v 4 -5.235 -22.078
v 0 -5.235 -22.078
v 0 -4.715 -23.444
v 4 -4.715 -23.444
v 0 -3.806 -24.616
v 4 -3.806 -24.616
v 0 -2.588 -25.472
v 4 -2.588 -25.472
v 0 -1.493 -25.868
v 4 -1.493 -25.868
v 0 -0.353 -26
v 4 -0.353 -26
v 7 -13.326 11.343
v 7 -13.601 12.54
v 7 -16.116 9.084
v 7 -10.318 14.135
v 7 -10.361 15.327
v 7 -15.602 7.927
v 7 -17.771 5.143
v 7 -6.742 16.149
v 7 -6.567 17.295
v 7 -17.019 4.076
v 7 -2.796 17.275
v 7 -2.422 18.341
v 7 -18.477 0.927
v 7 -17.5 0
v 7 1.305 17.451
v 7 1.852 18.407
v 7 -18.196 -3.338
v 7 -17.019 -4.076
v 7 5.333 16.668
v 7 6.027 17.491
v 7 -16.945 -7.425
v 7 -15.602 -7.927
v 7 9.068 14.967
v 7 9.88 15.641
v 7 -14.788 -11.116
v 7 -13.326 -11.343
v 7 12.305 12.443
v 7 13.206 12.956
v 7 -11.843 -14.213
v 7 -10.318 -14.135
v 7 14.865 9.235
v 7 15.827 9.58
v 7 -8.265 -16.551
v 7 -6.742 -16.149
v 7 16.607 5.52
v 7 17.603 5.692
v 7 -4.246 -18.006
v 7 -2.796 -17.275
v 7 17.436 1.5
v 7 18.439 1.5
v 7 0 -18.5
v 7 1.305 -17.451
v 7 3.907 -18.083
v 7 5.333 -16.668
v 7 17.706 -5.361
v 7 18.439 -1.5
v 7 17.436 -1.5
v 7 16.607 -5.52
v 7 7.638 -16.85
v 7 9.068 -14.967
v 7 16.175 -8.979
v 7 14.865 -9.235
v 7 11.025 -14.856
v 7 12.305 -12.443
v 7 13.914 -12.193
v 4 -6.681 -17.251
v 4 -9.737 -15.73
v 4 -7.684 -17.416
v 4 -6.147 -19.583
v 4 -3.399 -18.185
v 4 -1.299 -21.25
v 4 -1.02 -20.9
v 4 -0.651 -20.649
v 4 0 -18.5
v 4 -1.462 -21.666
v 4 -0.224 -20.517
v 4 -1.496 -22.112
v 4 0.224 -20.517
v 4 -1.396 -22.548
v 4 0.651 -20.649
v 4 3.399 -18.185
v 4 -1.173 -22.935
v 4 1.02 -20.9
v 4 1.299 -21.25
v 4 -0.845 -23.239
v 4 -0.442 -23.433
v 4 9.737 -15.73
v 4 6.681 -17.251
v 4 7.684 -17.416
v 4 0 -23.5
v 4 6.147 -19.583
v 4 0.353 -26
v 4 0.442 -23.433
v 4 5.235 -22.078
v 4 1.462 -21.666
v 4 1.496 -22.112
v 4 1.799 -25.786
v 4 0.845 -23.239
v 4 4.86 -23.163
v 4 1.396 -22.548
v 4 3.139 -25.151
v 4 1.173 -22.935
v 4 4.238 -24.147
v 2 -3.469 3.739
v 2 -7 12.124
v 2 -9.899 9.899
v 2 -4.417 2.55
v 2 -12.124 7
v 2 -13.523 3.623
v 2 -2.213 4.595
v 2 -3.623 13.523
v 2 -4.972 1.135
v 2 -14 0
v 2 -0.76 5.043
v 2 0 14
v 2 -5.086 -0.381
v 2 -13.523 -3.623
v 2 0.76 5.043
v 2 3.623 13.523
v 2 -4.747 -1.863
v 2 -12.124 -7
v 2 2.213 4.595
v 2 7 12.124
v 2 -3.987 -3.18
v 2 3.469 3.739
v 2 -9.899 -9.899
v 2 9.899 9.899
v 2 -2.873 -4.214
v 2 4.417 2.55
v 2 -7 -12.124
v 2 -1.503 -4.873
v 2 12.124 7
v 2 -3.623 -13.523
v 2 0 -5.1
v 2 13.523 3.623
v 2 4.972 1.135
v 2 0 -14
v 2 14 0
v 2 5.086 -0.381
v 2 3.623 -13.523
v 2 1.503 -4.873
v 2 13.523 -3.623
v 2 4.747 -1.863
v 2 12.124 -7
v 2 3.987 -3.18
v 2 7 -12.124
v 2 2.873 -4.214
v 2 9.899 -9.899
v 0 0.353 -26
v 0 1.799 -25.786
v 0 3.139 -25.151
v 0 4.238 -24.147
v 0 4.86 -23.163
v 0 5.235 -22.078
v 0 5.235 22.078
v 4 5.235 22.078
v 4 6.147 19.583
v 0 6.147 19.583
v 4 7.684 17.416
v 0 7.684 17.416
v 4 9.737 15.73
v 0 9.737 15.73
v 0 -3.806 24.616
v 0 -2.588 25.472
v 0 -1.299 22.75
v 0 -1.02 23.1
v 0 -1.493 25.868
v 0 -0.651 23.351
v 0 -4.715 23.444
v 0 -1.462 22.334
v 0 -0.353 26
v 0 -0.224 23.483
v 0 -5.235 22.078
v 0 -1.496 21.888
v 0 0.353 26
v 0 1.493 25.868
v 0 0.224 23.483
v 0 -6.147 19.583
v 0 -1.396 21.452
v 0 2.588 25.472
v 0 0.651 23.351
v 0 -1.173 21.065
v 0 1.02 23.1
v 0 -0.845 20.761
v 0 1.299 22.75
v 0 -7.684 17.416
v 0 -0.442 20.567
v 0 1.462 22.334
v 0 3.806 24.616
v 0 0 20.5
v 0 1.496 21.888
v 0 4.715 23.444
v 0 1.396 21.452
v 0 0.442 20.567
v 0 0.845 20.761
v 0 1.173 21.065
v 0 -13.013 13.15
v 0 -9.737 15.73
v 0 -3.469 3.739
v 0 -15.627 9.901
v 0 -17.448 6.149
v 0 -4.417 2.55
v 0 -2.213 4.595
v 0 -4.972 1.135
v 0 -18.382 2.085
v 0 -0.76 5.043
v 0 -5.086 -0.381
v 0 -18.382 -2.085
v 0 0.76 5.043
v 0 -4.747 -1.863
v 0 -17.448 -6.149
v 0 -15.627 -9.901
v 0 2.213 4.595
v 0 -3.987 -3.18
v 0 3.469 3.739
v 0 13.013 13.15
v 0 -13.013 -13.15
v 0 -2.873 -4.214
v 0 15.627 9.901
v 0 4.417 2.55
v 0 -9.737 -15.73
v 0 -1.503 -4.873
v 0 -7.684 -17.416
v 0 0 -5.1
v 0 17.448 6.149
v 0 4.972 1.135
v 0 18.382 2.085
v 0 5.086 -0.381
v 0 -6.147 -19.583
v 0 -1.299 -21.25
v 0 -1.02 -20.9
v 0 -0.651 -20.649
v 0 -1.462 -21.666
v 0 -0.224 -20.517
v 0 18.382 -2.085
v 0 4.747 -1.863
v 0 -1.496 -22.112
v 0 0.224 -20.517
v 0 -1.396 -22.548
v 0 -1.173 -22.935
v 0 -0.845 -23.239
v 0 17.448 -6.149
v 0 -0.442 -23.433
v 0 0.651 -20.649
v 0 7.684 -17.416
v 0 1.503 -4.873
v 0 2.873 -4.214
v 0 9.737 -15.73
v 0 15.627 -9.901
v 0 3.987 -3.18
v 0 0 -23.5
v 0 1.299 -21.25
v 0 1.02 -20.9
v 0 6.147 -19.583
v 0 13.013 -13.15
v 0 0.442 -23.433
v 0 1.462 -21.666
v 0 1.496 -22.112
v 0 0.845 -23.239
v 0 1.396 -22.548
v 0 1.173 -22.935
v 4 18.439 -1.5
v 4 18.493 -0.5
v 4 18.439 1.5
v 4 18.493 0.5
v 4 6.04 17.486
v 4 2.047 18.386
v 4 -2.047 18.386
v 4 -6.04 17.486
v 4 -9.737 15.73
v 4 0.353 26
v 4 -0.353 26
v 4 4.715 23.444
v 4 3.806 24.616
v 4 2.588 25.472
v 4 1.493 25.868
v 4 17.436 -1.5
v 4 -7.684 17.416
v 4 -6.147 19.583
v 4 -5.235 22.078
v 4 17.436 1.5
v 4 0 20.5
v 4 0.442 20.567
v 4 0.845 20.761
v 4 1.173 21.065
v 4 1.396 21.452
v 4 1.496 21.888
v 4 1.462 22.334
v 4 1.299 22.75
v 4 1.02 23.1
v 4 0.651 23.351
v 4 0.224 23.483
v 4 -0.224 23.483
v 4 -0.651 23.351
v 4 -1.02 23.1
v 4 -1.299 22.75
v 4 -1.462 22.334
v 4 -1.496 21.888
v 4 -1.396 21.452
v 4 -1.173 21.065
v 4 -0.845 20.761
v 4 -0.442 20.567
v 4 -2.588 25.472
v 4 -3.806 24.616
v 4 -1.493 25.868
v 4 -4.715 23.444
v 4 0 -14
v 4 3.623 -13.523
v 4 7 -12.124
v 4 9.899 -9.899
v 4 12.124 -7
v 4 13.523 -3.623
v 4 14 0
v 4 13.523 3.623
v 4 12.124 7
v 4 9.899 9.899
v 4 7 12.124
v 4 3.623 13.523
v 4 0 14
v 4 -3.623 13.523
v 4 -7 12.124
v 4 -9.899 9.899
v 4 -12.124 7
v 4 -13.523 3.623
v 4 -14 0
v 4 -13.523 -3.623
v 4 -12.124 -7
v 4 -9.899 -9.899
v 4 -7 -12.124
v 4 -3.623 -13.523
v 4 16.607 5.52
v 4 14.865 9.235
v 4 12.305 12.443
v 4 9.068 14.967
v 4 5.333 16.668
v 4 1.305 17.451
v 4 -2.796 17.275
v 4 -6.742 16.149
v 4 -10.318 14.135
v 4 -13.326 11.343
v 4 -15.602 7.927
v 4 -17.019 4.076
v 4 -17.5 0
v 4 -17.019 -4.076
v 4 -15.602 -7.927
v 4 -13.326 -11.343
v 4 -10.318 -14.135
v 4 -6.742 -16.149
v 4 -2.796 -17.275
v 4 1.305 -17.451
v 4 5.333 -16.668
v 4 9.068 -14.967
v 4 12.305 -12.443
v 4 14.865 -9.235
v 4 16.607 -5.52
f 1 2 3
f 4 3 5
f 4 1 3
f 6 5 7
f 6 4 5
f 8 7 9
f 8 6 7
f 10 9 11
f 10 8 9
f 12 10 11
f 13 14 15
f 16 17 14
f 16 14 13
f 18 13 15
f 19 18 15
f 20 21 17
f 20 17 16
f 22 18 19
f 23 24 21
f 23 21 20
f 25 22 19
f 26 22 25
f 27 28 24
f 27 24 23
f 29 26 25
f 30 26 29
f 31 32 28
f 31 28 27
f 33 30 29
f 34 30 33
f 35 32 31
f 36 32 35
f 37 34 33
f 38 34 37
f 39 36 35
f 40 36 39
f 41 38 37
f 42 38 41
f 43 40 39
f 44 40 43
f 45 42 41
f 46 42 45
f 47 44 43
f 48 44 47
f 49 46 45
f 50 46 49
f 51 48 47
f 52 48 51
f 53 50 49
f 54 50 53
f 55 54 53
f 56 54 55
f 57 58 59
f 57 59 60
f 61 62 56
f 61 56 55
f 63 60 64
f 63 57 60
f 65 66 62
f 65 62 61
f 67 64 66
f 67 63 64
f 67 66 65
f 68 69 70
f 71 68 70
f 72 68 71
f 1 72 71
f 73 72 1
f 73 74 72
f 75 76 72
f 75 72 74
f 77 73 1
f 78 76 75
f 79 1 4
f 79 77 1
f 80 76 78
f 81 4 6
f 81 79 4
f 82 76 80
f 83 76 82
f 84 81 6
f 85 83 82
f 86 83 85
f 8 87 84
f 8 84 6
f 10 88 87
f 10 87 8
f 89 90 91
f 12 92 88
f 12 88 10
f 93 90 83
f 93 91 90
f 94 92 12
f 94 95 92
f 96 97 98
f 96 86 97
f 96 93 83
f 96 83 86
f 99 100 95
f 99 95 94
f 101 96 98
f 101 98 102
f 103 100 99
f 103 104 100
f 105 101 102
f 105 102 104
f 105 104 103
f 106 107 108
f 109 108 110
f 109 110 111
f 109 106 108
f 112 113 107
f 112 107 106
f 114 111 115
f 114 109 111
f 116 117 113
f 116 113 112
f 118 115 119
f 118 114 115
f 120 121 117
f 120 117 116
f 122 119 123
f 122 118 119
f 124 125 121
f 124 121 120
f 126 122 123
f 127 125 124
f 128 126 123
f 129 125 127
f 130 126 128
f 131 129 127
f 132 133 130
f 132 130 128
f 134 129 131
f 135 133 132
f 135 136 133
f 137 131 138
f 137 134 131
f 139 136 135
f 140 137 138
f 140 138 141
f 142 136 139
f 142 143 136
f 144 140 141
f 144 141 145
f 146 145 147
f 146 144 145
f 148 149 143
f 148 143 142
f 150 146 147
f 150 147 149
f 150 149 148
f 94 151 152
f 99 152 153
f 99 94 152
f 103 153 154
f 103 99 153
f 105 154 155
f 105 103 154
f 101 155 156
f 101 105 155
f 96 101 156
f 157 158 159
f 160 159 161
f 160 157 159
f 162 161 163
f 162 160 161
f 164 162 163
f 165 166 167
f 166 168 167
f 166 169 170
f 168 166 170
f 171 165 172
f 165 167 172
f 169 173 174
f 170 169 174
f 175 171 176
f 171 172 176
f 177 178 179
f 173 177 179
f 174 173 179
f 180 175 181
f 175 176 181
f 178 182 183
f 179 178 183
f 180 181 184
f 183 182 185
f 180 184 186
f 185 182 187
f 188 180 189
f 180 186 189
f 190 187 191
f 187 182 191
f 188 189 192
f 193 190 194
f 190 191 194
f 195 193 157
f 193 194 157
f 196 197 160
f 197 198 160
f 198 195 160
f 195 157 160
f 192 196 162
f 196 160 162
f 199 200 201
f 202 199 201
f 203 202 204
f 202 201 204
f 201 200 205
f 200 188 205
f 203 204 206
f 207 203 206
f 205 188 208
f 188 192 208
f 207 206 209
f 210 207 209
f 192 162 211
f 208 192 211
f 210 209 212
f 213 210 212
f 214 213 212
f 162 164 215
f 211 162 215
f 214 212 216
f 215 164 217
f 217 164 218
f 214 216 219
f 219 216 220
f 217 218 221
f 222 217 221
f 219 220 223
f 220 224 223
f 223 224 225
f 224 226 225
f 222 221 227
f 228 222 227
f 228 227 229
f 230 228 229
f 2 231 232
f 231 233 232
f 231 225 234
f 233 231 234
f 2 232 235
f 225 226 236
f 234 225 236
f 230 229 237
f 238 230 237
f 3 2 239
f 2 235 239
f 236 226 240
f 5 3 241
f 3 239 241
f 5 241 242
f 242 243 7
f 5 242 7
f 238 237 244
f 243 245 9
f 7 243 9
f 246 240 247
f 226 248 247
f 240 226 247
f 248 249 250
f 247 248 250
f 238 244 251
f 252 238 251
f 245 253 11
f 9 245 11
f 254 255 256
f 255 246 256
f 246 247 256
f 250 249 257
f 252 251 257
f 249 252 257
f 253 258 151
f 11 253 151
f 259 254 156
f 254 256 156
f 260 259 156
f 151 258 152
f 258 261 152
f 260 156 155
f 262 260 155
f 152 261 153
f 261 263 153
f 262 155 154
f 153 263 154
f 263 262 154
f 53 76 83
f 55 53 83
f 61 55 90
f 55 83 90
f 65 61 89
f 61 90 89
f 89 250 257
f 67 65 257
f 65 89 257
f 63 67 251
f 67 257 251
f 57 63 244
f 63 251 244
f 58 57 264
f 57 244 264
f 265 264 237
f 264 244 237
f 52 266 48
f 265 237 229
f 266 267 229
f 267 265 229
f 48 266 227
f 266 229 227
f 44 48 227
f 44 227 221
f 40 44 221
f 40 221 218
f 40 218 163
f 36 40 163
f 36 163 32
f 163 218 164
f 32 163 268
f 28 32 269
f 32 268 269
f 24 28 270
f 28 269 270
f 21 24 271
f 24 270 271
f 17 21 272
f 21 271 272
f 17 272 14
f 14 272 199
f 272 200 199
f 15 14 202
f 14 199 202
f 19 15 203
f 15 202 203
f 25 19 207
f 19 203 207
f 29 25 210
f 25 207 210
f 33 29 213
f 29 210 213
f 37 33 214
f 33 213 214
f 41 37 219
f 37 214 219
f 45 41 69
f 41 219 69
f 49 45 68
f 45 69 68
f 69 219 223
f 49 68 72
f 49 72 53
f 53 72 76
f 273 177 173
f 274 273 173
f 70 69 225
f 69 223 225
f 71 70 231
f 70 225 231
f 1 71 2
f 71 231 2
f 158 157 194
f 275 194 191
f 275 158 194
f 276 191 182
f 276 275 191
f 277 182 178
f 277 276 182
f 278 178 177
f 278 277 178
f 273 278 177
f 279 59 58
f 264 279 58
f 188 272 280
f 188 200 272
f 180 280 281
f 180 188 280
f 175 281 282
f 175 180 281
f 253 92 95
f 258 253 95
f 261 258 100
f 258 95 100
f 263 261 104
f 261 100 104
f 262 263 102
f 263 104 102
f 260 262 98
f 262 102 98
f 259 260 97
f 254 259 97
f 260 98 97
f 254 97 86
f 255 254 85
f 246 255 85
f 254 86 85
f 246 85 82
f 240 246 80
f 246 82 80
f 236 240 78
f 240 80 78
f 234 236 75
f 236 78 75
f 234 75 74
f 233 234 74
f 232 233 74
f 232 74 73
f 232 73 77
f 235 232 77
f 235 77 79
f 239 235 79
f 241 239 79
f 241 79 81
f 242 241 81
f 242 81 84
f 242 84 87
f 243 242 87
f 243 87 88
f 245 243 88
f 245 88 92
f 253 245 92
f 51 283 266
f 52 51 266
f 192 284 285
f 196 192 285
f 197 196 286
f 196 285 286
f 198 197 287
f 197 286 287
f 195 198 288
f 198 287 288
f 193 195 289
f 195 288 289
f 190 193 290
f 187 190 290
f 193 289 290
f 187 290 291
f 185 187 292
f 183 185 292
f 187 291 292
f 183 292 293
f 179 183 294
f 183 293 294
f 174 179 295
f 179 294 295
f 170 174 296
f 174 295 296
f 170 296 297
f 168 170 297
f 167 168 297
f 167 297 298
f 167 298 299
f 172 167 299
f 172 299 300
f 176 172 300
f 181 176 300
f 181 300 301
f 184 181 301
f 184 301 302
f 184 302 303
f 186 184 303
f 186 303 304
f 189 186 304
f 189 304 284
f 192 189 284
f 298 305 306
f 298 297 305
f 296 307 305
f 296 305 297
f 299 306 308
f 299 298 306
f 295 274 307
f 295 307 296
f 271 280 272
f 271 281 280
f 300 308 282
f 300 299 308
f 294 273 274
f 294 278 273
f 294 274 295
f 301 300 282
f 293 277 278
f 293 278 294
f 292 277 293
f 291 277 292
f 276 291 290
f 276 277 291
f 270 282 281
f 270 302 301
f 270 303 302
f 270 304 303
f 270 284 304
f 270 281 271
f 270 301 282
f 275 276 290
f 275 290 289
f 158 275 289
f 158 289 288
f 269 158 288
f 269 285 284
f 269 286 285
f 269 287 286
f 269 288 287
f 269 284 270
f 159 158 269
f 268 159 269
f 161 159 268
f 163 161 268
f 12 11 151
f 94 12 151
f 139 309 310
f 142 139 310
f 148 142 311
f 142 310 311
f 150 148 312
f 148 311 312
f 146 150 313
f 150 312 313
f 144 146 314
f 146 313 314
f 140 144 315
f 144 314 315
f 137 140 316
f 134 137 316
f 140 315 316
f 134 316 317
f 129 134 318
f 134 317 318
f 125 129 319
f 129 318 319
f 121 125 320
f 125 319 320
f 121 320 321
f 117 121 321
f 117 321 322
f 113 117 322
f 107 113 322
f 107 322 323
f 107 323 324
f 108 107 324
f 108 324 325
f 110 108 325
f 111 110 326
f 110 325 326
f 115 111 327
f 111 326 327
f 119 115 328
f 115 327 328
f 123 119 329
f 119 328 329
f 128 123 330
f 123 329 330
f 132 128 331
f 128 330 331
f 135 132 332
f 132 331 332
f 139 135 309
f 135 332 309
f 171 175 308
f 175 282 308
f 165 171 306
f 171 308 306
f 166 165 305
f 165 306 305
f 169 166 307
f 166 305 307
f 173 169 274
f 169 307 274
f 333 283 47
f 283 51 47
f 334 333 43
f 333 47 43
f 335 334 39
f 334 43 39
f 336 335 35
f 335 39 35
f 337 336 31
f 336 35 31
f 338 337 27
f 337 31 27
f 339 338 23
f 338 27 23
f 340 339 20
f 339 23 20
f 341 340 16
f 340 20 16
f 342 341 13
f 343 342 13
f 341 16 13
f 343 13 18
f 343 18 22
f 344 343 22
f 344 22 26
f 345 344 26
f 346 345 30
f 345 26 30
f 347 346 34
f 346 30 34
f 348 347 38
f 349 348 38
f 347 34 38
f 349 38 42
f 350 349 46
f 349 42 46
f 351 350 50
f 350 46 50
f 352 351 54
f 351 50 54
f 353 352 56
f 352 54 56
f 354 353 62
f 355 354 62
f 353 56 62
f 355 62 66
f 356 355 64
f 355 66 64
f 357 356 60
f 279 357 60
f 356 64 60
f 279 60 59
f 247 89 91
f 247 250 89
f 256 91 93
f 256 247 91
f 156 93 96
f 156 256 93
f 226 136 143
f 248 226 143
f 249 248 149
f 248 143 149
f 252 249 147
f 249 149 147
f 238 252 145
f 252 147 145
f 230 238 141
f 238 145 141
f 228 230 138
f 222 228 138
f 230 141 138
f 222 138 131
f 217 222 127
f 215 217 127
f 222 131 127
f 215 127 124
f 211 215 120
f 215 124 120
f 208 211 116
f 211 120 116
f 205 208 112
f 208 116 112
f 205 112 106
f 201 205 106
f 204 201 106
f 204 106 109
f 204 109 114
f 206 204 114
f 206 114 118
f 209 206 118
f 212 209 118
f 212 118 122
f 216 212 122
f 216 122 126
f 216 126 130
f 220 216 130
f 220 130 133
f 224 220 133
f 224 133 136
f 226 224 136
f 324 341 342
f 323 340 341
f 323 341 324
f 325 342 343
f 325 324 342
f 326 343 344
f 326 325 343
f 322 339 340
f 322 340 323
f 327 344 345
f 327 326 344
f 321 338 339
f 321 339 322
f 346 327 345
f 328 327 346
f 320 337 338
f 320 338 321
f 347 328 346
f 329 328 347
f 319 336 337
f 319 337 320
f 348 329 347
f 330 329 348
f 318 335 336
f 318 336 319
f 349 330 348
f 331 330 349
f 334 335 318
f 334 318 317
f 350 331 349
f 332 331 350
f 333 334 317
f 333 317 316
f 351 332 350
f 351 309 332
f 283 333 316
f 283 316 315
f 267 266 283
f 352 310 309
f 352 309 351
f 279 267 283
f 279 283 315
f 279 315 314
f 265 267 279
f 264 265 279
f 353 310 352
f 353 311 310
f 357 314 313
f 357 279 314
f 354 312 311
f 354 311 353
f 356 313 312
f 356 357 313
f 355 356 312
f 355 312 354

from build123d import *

# Parameters (mm, degrees)
SKETCH_1_R          = 18.5
EXTRUDE_1_DEPTH     = 7
EXTRUDE_2_DEPTH     = 4
SKETCH_2_R          = 17.5
CUT_EXTRUDE_1_DEPTH = 3
SKETCH_3_R          = 14
CUT_EXTRUDE_2_DEPTH = 2
CUT_EXTRUDE_5_REACH = 34.299
SKETCH_8_R          = 5.1
CUT_EXTRUDE_6_REACH = 34.16
SKETCH_11_R         = 1.5
FILLET_1_R          = 10
FILLET_2_R          = 5
SKETCH_12_W         = 3
SKETCH_12_H         = 2.288293169
CUT_EXTRUDE_7_DEPTH = 3


with BuildPart() as part:
    # 草图1 → 凸台-拉伸1 (new body)
    with BuildSketch(Plane(origin=(0, 0, 0), x_dir=(0, 0, -1), z_dir=(1, 0, 0))):
        Circle(SKETCH_1_R)
    extrude(amount=EXTRUDE_1_DEPTH)

    # 草图10 → 凸台-拉伸2 (add)
    with BuildSketch(Plane.ZY):
        Polygon((0, 5), (26, 5), (26, -5), (0, -5), (-26, -5), (-26, 5), align=None)
    extrude(amount=-EXTRUDE_2_DEPTH)

    # 草图2 → 切除-拉伸1 (cut)
    with BuildSketch(Plane(origin=(7, 0, 0), x_dir=(0, 0, -1), z_dir=(1, 0, 0))):
        Circle(SKETCH_2_R)
    extrude(amount=-CUT_EXTRUDE_1_DEPTH, mode=Mode.SUBTRACT)

    # 草图3 → 切除-拉伸2 (cut)
    with BuildSketch(Plane(origin=(4, 0, 0), x_dir=(0, 0, -1), z_dir=(1, 0, 0))):
        Circle(SKETCH_3_R)
    extrude(amount=-CUT_EXTRUDE_2_DEPTH, mode=Mode.SUBTRACT)

    # 草图8 → 切除-拉伸5 (cut, up to next)
    with BuildSketch(Plane(origin=(2, 0, 0), x_dir=(0, 0, -1), z_dir=(1, 0, 0)), mode=Mode.PRIVATE) as cut_extrude_5_sk1:
        Circle(SKETCH_8_R)
    cut_extrude_5_tool1 = extrude(cut_extrude_5_sk1.sketch, amount=-CUT_EXTRUDE_5_REACH, mode=Mode.PRIVATE) & part.part
    add(cut_extrude_5_tool1.solids().sort_by_distance((2, 0, 0))[0], mode=Mode.SUBTRACT)

    # 草图11 → 切除-拉伸6 (cut, up to next)
    with BuildSketch(Plane(origin=(4, 0, 0), x_dir=(0, 0, -1), z_dir=(1, 0, 0)), mode=Mode.PRIVATE) as cut_extrude_6_sk1:
        with Locations((-22, 0)):
            Circle(SKETCH_11_R)
    cut_extrude_6_tool1 = extrude(cut_extrude_6_sk1.sketch, amount=-CUT_EXTRUDE_6_REACH, mode=Mode.PRIVATE) & part.part
    # 草图11 → 切除-拉伸6 (cut, up to next)
    with BuildSketch(Plane(origin=(4, 0, 0), x_dir=(0, 0, -1), z_dir=(1, 0, 0)), mode=Mode.PRIVATE) as cut_extrude_6_sk2:
        with Locations((22, 0)):
            Circle(SKETCH_11_R)
    cut_extrude_6_tool2 = extrude(cut_extrude_6_sk2.sketch, amount=-CUT_EXTRUDE_6_REACH, mode=Mode.PRIVATE) & part.part
    add(cut_extrude_6_tool1.solids().sort_by_distance((4, 0, 22))[0], mode=Mode.SUBTRACT)
    add(cut_extrude_6_tool2.solids().sort_by_distance((4, 0, -22))[0], mode=Mode.SUBTRACT)

    # 圆角1
    fillet_1_edges = [part.edges().sort_by_distance(p)[0] for p in [
        (2, 5, -17.811513131),
        (2, 5, 17.811513131),
        (2, -5, 17.811513131),
        (2, -5, -17.811513131),
    ]]
    fillet(fillet_1_edges, radius=FILLET_1_R)

    # 圆角2
    fillet_2_edges = [part.edges().sort_by_distance(p)[0] for p in [
        (2, 5, 26),
        (2, -5, 26),
        (2, -5, -26),
        (2, 5, -26),
    ]]
    fillet(fillet_2_edges, radius=FILLET_2_R)

    # 草图12 → 切除-拉伸7 (cut)
    with BuildSketch(Plane(origin=(7, 0, 0), x_dir=(0, 0, -1), z_dir=(1, 0, 0))):
        with Locations((0, 18.044159171)):
            Rectangle(SKETCH_12_W, SKETCH_12_H)
    extrude(amount=-CUT_EXTRUDE_7_DEPTH, mode=Mode.SUBTRACT)


solid = part.part
